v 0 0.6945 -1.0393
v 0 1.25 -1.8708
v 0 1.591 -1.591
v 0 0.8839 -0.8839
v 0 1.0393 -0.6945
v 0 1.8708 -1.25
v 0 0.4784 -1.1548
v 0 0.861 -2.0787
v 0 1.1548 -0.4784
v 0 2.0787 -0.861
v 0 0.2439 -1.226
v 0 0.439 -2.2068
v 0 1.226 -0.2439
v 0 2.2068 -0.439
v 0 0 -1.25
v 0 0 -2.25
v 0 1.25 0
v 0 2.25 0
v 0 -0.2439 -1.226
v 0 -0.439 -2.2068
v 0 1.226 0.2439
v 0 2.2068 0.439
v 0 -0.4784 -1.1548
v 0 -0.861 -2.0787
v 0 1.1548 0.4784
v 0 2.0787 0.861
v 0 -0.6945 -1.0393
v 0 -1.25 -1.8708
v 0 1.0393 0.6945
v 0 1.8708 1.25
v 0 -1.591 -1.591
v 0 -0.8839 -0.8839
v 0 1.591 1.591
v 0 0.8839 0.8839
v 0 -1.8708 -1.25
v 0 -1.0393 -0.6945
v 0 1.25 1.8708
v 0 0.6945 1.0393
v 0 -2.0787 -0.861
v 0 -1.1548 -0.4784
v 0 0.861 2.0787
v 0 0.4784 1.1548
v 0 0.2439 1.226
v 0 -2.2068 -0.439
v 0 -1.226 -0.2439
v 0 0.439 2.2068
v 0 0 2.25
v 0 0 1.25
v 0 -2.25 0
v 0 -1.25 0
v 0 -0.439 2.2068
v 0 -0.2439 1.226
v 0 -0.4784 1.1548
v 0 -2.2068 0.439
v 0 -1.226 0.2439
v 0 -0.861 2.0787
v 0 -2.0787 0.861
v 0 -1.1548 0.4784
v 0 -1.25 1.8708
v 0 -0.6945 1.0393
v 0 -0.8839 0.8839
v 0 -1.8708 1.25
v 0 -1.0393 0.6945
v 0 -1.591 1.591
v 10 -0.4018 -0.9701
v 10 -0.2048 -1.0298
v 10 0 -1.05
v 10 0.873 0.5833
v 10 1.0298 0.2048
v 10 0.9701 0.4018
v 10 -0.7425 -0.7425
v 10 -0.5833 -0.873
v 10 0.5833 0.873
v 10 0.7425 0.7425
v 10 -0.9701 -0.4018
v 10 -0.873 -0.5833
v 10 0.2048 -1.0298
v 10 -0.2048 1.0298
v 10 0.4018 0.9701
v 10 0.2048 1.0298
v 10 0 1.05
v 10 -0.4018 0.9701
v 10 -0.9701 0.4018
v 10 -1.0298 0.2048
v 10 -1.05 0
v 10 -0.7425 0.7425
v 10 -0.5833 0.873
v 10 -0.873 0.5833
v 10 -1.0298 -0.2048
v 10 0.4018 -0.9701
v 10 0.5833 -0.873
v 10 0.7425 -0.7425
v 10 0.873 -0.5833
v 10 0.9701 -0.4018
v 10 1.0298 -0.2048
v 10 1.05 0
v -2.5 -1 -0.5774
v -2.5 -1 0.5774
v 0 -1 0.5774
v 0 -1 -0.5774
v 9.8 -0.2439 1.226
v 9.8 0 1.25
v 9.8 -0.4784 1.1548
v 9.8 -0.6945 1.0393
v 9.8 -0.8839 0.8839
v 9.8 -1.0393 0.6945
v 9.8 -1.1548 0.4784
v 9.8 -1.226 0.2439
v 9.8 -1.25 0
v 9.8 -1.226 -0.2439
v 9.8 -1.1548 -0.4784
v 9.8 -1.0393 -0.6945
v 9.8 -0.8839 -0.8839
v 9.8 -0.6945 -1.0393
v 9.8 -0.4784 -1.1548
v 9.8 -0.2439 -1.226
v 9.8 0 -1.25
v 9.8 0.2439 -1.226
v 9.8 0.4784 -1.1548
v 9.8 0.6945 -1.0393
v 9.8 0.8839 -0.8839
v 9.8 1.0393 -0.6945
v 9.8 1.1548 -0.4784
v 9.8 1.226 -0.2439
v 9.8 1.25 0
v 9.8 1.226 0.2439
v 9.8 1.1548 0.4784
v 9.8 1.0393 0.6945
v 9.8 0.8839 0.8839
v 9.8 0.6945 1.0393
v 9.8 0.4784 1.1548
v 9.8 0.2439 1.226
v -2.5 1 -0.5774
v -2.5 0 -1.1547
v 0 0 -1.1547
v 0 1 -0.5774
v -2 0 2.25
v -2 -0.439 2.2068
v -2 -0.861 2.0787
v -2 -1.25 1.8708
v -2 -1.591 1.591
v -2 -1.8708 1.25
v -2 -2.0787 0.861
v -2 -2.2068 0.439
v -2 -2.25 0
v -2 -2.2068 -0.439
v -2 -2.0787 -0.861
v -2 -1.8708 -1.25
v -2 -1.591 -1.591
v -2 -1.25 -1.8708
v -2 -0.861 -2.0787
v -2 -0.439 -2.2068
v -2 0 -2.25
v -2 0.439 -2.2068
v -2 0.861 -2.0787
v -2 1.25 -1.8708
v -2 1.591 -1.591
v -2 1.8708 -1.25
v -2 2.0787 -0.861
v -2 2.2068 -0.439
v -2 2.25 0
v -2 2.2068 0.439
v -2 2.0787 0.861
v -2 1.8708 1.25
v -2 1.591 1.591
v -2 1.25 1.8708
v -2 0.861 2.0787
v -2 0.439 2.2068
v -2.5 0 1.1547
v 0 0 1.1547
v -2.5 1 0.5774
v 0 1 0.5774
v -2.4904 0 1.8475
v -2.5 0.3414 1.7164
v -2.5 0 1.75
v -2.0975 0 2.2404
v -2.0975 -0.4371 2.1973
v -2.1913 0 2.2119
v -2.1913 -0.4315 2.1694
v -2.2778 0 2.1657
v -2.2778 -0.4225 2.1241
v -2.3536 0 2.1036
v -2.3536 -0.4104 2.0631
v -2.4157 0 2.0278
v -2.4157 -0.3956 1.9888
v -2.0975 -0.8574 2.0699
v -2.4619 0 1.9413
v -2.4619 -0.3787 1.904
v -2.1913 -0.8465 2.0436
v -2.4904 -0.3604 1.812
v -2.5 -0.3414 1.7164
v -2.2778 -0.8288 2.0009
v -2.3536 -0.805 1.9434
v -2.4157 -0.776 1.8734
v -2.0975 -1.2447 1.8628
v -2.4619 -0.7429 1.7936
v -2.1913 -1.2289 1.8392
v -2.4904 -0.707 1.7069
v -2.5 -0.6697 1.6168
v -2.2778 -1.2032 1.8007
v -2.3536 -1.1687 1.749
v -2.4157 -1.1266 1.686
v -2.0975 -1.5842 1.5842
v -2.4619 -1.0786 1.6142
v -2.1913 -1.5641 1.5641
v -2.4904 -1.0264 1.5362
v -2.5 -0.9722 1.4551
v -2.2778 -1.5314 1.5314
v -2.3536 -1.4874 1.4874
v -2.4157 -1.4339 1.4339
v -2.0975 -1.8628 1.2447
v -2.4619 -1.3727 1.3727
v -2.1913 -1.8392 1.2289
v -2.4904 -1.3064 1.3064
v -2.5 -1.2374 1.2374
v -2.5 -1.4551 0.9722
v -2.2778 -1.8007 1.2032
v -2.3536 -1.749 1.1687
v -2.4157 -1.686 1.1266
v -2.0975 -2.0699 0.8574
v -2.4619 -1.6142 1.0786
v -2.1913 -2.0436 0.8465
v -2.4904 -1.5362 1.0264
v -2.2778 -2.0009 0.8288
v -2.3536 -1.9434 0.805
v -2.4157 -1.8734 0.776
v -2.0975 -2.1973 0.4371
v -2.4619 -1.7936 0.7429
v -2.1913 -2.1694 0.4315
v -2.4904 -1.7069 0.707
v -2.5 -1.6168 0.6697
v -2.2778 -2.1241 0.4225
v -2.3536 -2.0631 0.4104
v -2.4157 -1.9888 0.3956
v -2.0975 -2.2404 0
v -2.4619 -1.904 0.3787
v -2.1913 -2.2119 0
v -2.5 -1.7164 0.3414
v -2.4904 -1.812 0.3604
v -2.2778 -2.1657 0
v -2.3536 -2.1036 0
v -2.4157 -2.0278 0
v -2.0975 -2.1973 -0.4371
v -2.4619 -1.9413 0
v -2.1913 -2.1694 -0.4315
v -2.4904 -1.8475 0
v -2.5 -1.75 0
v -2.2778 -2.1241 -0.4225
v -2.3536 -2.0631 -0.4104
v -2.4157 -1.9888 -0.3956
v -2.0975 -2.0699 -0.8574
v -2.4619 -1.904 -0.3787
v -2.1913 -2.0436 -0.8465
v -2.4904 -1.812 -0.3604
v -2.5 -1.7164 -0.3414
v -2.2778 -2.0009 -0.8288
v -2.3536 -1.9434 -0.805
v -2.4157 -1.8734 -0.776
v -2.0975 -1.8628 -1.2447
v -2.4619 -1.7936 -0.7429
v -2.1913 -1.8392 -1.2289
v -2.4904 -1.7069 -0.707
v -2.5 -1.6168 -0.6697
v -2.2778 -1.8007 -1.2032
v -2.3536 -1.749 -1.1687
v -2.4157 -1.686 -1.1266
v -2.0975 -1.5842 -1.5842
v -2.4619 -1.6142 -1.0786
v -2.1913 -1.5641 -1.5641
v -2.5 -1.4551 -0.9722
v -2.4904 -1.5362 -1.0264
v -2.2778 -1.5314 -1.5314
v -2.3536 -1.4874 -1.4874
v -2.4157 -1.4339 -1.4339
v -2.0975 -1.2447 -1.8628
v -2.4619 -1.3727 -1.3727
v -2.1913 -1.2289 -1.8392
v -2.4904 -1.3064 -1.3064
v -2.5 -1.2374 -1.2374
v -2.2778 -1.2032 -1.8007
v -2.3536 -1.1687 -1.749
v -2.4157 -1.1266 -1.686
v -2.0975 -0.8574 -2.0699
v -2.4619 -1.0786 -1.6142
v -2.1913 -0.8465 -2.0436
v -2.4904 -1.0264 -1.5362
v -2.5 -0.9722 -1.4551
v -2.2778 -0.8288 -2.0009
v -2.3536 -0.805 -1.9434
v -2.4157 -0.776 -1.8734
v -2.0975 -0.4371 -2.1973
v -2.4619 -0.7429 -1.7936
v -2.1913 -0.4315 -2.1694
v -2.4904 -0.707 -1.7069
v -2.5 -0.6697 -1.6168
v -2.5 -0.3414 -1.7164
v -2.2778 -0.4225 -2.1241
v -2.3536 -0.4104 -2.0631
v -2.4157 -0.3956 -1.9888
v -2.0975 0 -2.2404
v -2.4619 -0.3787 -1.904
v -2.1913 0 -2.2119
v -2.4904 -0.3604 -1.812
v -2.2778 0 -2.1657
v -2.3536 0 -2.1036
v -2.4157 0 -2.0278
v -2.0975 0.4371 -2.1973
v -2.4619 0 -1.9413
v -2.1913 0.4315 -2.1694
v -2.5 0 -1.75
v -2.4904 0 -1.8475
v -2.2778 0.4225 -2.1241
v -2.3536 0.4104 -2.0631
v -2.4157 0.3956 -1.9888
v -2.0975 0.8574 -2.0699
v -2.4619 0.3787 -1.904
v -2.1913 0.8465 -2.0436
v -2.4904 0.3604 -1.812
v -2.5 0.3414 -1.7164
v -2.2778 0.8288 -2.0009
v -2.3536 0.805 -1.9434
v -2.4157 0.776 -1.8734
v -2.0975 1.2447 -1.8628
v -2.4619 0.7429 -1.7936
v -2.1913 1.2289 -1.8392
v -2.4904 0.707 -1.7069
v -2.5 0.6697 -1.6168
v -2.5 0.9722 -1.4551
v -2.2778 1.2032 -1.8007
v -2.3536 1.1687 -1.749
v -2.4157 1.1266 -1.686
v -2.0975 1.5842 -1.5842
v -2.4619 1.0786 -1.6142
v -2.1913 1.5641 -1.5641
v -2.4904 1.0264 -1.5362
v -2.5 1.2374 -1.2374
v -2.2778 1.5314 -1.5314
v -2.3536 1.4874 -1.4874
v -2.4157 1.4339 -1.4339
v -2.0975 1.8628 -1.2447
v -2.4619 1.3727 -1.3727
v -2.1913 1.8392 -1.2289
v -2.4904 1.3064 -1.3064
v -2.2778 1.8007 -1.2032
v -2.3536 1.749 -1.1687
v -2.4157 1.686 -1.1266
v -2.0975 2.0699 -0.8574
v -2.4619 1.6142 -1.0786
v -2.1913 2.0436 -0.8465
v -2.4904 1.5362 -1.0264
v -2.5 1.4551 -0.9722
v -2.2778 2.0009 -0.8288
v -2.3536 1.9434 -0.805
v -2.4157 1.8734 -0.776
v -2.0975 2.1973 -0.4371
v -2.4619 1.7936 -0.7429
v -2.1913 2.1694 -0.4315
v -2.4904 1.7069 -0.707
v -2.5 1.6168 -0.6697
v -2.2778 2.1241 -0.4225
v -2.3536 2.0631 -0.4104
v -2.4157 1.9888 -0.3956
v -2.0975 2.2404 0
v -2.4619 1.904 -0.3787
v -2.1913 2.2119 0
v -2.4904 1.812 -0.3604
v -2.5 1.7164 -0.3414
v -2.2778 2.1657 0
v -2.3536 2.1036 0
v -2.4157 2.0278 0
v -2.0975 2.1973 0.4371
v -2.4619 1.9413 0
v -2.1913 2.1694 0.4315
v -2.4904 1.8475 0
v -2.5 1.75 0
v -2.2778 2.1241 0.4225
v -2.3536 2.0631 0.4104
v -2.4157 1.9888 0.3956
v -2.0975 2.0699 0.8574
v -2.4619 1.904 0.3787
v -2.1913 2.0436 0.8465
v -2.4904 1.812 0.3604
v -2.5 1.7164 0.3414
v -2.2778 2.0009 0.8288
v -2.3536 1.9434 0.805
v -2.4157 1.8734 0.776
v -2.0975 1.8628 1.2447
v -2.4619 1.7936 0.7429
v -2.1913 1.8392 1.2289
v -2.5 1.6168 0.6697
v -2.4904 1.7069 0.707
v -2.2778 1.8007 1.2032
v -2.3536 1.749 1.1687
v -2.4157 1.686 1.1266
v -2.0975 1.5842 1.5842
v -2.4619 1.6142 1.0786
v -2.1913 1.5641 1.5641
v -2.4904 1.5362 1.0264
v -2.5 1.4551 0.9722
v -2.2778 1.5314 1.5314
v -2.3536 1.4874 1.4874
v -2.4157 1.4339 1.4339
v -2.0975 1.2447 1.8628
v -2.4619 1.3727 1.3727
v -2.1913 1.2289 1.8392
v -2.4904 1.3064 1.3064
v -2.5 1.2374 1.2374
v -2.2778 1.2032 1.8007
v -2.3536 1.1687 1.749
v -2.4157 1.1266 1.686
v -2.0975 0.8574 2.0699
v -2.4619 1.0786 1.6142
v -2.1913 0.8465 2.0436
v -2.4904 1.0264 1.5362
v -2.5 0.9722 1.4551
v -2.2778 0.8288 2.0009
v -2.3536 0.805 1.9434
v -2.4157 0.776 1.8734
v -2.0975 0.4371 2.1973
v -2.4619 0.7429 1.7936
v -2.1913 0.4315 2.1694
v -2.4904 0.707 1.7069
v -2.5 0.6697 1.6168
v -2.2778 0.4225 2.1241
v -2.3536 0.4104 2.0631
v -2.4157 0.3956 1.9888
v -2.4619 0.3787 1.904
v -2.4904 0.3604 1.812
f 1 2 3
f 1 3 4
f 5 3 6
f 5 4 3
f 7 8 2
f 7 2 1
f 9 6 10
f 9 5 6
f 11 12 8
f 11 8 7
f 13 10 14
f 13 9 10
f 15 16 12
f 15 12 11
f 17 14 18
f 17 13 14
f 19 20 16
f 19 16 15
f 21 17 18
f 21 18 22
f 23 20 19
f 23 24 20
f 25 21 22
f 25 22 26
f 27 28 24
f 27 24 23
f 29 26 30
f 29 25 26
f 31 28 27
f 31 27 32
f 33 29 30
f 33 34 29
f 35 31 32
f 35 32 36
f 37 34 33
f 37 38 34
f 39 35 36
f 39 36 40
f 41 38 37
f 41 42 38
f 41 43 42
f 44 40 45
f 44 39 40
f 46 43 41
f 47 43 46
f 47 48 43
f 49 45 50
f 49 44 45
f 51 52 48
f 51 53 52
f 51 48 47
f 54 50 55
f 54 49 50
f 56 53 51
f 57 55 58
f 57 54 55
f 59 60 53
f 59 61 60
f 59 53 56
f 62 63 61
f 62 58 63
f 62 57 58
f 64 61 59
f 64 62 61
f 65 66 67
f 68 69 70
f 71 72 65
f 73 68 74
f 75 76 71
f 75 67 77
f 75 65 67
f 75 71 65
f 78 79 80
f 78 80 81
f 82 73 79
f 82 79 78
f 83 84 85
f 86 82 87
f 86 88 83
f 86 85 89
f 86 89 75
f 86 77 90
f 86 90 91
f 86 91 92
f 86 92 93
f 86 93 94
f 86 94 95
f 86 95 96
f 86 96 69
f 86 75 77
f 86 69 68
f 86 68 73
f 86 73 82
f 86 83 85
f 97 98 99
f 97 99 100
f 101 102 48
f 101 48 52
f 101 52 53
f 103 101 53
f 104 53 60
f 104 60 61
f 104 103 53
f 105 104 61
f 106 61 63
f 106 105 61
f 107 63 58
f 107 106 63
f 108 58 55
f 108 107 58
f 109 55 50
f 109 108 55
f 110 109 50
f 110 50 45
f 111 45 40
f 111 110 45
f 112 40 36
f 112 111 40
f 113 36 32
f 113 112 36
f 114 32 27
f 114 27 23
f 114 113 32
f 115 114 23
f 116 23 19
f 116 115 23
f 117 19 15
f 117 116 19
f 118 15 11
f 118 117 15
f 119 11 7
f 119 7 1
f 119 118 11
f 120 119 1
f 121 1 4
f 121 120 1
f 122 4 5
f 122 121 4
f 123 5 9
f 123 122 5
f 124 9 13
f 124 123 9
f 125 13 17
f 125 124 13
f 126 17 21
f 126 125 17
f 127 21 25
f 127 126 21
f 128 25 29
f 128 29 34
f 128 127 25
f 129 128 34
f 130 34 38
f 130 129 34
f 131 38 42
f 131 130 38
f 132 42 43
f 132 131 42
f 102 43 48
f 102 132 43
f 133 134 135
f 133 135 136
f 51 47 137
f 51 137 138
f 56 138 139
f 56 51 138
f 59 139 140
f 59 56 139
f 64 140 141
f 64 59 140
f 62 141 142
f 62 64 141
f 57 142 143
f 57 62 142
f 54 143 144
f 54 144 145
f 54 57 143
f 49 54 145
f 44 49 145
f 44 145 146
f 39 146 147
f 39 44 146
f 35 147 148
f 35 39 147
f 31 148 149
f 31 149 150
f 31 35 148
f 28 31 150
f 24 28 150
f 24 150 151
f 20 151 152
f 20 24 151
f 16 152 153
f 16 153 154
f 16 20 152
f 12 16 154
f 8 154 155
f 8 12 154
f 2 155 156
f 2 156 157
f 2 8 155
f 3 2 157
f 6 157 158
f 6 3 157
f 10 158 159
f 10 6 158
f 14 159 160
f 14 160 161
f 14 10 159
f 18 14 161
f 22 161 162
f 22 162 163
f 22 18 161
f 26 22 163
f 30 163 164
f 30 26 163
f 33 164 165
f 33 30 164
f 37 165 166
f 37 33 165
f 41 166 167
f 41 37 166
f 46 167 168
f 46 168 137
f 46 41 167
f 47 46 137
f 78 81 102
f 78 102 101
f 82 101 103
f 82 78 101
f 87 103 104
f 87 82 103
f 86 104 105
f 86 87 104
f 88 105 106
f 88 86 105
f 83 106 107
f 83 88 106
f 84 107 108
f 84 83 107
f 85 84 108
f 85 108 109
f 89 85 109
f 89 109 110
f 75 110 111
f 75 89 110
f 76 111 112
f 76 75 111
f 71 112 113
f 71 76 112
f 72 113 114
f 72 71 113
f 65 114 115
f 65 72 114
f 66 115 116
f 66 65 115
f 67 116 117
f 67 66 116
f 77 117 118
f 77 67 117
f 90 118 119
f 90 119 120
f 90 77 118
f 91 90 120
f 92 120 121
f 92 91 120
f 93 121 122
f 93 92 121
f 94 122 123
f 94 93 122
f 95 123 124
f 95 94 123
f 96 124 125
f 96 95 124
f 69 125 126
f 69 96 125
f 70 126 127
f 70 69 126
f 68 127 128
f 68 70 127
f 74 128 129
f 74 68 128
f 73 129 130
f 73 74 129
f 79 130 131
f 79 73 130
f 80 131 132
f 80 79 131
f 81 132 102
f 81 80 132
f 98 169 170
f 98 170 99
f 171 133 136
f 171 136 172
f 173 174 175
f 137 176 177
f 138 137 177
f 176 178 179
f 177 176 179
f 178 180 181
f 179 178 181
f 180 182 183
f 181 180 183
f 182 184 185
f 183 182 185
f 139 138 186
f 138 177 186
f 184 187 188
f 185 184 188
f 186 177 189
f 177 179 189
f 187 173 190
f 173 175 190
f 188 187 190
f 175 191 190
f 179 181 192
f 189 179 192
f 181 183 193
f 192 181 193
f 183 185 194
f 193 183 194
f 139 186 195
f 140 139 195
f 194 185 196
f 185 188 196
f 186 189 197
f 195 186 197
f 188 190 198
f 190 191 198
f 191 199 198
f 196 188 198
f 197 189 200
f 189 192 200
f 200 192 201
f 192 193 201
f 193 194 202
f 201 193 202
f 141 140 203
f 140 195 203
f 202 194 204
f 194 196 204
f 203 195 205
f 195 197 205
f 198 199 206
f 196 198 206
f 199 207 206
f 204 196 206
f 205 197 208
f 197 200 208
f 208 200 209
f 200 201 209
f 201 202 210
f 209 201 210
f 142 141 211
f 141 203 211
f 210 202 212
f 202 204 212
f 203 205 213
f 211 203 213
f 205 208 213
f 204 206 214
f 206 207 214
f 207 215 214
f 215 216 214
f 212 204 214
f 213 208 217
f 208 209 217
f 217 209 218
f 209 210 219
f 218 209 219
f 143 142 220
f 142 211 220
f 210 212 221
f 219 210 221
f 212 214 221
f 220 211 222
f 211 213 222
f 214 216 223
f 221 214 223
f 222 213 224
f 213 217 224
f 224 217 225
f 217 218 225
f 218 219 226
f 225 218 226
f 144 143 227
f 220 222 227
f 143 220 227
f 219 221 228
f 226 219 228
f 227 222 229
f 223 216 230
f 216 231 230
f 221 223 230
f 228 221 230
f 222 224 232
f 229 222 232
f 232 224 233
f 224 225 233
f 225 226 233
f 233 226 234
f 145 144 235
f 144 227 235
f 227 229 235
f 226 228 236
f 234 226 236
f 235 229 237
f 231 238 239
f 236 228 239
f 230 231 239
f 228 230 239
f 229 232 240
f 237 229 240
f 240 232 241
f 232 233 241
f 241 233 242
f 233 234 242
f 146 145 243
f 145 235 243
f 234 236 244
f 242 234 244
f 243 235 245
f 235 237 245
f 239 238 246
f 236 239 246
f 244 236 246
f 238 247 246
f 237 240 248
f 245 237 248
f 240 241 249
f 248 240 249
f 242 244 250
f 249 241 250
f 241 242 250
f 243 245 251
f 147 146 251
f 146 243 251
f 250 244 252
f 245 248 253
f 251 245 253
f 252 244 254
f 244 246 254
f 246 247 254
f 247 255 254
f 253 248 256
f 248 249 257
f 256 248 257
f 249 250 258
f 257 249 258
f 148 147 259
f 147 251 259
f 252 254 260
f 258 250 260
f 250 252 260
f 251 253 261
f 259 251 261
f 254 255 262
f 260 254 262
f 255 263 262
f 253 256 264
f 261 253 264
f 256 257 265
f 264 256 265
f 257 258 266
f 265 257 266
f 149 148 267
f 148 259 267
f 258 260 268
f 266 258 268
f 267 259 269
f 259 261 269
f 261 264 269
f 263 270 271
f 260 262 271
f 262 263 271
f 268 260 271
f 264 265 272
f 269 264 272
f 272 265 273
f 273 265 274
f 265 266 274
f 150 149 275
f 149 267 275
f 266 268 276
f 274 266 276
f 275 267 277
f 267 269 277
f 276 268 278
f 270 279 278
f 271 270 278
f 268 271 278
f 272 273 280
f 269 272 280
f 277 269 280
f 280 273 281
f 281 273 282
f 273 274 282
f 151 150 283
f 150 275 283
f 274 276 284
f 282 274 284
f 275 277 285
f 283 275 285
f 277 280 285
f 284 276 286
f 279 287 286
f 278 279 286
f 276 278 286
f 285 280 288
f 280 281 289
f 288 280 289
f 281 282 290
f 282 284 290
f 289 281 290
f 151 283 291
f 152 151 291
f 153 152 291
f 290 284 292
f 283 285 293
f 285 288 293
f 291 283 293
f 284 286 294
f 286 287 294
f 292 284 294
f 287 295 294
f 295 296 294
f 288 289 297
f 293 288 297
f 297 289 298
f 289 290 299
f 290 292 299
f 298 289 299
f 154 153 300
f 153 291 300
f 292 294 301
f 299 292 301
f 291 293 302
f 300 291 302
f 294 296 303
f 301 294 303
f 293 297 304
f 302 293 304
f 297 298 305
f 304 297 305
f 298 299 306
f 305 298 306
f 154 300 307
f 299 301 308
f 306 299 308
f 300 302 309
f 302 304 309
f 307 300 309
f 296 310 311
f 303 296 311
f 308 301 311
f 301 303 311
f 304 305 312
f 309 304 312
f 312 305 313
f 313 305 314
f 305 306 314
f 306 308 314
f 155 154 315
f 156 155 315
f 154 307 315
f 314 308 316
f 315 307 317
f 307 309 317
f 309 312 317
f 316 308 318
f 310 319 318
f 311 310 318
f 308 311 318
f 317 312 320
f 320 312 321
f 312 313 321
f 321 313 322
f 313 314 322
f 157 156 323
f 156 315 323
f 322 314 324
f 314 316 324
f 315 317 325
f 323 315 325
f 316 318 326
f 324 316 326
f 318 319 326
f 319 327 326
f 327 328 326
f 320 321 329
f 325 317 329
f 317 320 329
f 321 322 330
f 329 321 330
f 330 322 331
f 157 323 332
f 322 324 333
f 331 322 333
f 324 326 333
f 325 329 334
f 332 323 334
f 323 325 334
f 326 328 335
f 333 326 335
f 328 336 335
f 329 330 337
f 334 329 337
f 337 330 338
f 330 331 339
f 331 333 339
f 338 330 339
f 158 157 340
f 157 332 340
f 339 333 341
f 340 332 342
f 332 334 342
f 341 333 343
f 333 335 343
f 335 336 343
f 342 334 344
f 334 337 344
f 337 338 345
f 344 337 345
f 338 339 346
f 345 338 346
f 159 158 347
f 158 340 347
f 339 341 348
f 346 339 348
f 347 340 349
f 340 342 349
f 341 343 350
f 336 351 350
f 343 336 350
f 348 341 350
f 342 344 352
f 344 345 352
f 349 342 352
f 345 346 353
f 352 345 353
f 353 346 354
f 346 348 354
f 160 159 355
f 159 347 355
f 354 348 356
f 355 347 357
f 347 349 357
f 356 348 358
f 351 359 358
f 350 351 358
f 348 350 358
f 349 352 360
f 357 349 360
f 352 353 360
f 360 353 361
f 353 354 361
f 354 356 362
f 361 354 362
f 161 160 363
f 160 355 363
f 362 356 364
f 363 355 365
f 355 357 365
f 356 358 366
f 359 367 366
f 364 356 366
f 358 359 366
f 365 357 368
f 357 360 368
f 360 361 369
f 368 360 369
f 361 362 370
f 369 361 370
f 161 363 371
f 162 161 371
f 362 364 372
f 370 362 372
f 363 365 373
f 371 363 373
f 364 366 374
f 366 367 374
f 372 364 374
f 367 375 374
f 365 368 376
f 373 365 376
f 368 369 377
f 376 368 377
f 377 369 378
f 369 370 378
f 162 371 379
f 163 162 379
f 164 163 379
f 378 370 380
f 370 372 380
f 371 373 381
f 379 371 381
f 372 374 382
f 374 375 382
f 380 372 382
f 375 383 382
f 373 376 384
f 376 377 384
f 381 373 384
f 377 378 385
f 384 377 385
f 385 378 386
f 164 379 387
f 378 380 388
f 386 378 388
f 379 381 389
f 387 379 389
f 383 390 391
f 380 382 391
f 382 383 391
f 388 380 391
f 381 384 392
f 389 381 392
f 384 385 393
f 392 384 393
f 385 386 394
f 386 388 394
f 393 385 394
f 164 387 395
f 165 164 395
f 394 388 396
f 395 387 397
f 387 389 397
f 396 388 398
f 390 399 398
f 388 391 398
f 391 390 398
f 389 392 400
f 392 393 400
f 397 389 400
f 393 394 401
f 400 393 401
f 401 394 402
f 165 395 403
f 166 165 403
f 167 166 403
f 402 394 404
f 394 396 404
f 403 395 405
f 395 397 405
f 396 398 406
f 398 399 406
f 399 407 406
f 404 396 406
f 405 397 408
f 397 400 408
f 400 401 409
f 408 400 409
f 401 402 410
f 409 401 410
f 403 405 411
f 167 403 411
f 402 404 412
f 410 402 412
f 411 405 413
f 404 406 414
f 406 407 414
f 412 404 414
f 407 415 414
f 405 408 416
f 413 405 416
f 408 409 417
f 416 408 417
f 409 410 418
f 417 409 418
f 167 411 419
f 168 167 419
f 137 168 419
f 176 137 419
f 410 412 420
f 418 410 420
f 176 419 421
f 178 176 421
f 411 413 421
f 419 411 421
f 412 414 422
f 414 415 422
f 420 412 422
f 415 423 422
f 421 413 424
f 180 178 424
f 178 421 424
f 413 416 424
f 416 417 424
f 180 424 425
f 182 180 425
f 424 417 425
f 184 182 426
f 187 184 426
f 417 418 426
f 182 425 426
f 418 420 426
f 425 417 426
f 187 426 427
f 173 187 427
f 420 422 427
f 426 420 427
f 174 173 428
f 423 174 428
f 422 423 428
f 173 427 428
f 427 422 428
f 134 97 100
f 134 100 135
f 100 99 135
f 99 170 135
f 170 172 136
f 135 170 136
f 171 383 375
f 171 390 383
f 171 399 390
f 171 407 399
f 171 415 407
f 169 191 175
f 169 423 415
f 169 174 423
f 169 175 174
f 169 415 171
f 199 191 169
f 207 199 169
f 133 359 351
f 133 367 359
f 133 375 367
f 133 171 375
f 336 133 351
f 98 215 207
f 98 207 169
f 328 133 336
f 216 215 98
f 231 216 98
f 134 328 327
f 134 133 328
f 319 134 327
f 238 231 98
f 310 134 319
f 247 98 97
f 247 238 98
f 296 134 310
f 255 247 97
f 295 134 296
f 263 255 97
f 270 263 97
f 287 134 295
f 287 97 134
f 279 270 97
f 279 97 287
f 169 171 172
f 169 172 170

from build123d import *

# Parameters (mm, degrees)
CHANFREIN1_SIZE         = 0.2
CONG_1_R                = 0.5
EMPREINTE_POUR_CL_DEPTH = 2.5


with BuildPart() as part:
    # Esquisse1 → Base-Révolution (revolve)
    with BuildSketch(Plane.XY, mode=Mode.PRIVATE) as base_r_volution_sk:
        Polygon((-2.5, 0), (-2.5, 2.25), (0, 2.25), (0, 1.25), (10, 1.25), (10, 0), align=None)
    revolve(base_r_volution_sk.sketch.rotate(Axis((-28.982684825, 0, 0), (1, 0, 0)), 90), axis=Axis((-28.982684825, 0, 0), (1, 0, 0)))

    # Chanfrein1
    chanfrein1_edges = [part.edges().sort_by_distance(p)[0] for p in [
        (10, 0, -1.25),
    ]]
    chamfer(chanfrein1_edges, length=CHANFREIN1_SIZE)

    # Congé1
    cong_1_edges = [part.edges().sort_by_distance(p)[0] for p in [
        (-2.5, 0, -2.25),
    ]]
    fillet(cong_1_edges, radius=CONG_1_R)

    # Esquisse2 → Empreinte pour clé (cut)
    with BuildSketch(Plane.ZY.offset(2.5)):
        Polygon((0.577350269, -1), (-0.577350269, -1), (-1.154700538, 0), (-0.577350269, 1), (0.577350269, 1), (1.154700538, 0), align=None)
    extrude(amount=-EMPREINTE_POUR_CL_DEPTH, mode=Mode.SUBTRACT)


solid = part.part
